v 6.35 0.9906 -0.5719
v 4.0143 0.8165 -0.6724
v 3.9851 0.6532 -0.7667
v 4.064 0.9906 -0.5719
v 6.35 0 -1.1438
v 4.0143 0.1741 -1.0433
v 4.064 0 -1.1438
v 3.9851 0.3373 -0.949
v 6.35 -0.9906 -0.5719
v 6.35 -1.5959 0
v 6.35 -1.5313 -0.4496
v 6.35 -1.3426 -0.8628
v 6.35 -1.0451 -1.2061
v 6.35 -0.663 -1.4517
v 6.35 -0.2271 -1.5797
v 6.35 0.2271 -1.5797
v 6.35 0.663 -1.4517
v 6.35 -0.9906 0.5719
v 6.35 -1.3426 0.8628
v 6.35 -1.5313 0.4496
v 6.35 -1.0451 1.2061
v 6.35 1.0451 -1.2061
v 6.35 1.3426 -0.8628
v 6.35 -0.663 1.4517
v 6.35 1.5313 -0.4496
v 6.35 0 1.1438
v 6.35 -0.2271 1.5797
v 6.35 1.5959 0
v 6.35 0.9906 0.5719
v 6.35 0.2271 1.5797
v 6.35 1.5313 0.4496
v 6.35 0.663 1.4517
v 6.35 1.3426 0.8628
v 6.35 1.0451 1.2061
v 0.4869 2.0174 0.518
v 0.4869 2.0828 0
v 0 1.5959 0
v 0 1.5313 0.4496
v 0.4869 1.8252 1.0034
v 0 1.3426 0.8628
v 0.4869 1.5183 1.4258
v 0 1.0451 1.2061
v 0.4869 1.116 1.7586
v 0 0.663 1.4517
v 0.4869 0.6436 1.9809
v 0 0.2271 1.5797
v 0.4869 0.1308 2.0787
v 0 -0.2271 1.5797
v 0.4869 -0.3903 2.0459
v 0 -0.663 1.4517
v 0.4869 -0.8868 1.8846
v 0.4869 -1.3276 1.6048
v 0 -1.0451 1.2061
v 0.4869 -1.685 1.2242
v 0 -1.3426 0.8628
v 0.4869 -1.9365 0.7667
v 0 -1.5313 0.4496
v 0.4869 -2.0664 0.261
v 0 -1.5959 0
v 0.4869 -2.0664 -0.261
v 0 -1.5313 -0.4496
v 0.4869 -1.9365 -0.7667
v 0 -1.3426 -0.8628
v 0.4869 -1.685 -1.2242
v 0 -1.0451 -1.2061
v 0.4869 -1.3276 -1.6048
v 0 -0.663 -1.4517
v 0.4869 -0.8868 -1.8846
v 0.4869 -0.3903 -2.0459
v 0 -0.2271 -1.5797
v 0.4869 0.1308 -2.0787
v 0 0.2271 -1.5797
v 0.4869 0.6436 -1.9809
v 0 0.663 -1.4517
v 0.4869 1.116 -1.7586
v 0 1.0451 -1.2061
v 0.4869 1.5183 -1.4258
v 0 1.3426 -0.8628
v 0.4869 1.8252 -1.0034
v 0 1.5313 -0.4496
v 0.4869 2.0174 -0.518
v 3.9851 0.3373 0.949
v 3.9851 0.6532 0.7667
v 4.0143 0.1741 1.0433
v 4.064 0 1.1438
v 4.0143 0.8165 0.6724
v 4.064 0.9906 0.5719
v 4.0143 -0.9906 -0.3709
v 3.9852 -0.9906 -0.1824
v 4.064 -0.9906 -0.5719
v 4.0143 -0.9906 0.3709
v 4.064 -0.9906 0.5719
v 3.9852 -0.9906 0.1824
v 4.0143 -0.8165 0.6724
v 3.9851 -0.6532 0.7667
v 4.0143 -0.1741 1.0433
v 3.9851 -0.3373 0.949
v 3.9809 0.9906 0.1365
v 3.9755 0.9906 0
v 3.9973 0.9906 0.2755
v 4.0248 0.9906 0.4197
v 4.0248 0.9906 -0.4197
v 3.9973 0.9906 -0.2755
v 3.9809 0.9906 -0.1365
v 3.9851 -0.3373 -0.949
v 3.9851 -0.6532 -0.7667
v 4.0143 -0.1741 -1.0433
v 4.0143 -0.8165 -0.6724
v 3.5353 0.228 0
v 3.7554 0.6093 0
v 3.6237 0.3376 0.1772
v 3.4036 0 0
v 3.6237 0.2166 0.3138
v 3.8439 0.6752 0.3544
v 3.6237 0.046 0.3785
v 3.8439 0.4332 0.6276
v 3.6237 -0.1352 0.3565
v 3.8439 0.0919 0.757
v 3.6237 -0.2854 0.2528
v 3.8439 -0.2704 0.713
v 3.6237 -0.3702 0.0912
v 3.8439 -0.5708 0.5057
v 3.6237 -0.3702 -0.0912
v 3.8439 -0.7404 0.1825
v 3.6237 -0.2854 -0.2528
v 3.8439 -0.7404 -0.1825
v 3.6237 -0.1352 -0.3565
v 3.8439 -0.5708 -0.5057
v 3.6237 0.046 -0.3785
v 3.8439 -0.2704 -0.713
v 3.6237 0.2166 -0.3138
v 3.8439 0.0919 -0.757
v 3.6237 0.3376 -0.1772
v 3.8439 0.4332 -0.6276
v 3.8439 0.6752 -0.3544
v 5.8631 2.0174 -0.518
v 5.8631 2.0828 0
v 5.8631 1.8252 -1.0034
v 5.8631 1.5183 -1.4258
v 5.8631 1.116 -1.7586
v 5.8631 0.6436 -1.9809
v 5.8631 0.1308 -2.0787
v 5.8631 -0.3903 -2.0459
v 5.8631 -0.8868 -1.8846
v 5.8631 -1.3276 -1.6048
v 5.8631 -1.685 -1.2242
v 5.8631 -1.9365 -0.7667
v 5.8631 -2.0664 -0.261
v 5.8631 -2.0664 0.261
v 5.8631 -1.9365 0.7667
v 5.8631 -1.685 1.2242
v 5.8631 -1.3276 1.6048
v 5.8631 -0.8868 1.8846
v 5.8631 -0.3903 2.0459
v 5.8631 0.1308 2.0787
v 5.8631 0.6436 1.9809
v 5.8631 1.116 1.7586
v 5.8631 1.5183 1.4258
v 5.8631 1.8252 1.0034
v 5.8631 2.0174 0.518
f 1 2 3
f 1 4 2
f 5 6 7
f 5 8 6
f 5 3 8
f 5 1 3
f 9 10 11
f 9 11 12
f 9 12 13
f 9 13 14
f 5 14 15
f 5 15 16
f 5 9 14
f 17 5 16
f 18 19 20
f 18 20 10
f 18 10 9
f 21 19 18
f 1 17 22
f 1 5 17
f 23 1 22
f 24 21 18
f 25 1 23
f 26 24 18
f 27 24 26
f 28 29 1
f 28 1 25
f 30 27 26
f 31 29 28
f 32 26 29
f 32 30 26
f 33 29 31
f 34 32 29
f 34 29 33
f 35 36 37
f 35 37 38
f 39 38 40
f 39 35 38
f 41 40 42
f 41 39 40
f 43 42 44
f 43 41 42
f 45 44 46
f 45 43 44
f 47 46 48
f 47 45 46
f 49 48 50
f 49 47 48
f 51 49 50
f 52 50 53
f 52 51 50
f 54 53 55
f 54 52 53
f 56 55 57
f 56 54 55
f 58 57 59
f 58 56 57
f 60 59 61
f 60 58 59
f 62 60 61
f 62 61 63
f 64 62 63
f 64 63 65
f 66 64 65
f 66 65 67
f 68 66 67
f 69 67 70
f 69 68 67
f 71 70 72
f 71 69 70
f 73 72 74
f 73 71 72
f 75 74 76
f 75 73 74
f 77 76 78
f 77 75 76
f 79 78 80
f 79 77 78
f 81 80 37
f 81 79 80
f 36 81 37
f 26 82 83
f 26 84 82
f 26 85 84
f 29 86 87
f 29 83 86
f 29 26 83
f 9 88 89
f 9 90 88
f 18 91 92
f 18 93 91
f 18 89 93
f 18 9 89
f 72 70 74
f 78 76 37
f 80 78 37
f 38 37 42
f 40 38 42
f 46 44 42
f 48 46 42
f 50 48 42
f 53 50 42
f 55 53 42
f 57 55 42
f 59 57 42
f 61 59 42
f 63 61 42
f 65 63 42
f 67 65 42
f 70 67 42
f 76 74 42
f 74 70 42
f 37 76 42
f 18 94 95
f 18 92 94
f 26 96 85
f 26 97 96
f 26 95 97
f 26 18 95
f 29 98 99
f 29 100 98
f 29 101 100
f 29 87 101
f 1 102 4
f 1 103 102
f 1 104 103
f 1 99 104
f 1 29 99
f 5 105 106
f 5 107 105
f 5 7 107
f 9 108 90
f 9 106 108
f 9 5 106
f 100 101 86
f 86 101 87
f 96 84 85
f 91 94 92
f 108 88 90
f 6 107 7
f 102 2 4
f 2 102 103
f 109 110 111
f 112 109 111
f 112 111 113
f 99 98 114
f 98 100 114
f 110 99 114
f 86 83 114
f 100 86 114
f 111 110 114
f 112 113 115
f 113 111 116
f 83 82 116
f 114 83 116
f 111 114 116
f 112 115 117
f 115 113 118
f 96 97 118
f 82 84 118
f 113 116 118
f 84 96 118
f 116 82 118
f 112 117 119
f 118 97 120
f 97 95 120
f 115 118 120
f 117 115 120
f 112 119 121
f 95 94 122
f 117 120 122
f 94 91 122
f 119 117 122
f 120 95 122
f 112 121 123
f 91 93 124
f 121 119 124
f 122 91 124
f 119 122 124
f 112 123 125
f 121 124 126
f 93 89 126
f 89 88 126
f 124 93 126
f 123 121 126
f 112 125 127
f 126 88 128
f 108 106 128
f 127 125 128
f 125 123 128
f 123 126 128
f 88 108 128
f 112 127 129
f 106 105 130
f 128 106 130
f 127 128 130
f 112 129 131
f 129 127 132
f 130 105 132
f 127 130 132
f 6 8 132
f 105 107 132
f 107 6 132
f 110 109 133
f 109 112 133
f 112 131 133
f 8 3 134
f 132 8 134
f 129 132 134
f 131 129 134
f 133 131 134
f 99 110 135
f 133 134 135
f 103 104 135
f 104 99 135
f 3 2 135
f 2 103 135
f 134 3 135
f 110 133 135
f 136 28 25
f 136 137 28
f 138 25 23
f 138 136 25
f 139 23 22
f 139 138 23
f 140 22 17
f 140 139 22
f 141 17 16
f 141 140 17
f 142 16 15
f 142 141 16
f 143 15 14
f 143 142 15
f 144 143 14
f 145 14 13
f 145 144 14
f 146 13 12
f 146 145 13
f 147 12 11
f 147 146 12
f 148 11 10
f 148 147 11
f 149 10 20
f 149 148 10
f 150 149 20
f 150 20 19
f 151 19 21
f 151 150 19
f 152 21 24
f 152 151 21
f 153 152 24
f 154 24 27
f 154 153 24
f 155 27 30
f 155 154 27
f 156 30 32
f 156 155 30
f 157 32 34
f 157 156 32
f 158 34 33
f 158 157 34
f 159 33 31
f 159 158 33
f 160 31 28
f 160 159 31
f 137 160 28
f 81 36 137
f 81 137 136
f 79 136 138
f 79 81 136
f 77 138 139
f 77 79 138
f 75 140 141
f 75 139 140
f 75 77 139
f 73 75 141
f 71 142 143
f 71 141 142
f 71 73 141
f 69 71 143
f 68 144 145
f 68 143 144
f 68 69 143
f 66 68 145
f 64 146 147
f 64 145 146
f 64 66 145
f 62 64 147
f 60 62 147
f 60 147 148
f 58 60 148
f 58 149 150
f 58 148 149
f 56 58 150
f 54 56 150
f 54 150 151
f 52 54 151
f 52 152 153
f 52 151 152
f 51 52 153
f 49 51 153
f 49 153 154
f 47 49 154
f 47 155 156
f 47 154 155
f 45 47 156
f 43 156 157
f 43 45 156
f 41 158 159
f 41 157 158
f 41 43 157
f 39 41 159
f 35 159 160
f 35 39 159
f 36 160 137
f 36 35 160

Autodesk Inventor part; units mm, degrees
ref_plane "YZ Plane" through (0, 0, 0) normal (1, 0, 0) x (0, 1, 0)
ref_plane "XZ Plane" through (0, 0, 0) normal (0, 1, 0) x (-1, 0, 0)
sketch "Sketch1" plane through (0, 0, 0) normal (0, 0, 1) x (1, 0, 0)
  line L0 (0, 0) -> (3.4036, 0)
  line L1 (6.35, 1.1438) -> (6.35, 2.0828)
  line L2 (6.35, 2.0828) -> (0, 2.0828)
  line L3 (6.35, 1.1438) -> (4.064, 1.1438)
  line L4 (4.064, 1.1438) -> (3.4036, 0)
  line L5 (0, -0.4166) -> (0, 2.4994) projected
  line L6 (0, 2.0828) -> (0, 0)
  dimension "d0" = 2.286
  dimension "d1" = 60
  dimension "d2" = 4.1656
  dimension "d3" = 2.2877
  dimension "d5" = 6.35
revolve "Body" add sketch "Sketch1" angle 360 about axis through (0, 0, 0) along (1, 0, 0)
chamfer "Chamfer1" distance 0.4869 angle 45 1 edges at (6.35, -2.0828, 0) measured on face at (6.35, 1.7386, -0.2574)
sketch "Sketch2" plane through (6.35, 0, 0) normal (1, 0, 0) x (0, 0, -1)
  circle A0 centre (0, 0) radius 1.1438 projected
  line L0 (-0.5719, 0.9906) -> (0.5719, 0.9906)
  line L1 (0.5719, 0.9906) -> (1.1438, 0)
  line L2 (1.1438, 0) -> (0.5719, -0.9906)
  line L3 (0.5719, -0.9906) -> (-0.5719, -0.9906)
  line L4 (-0.5719, -0.9906) -> (-1.1438, 0)
  line L5 (-1.1438, 0) -> (-0.5719, 0.9906)
  point P0 (0, 0)
  point P1 (0, 0)
extrude "Slot" add sketch "Sketch2" against normal up to next contours L1 A0 | A0 L2 | L0 A0 | A0 L3 | L5 A0 | A0 L4
thread "Thread" size "8-32 UNC" class "2A" standard "ANSI Unified Screw Threads" length 6.35
chamfer "Chamfer2" distance 0.4869 angle 45 1 edges at (0, -2.0828, 0) measured on face at (1.9544, 2.076, -0.1676)
ref_plane "Work Plane1" through (3.175, 0, 0) normal (0, 0.5, 0.866) x (1, 0, 0)
equation "\"d0\" = INTI"
equation "\"d2\" = NND"
equation "\"d3\" = 1.1547 * SW"
equation "\"d5\" = NLG"
equation "\"d7\" = -0.5 * GD1 + 0.5 * NND"
equation "\"d8\" = FAWI"
equation "\"d29\" = -0.5 * GD1 + 0.5 * NND"
equation "\"d11\" = NLG"
equation "\"d13\" = -0.5 * GD1 + 0.5 * NND"
equation "\"d14\" = FAWI"
equation "\"d30\" = -0.5 * GD1 + 0.5 * NND"
equation "\"NND\" = 4.1656"
equation "\"NLG\" = 6.35"
equation "\"INTI\" = 2.286"
equation "\"FAWI\" = 45deg"
equation "\"SW\" = 1.9812"
equation "\"GD1\" = 3.19177"
equation "\"FAWI1\" = 45deg"
equation "\"SPD\" = 2.2098"
equation "\"SEWI\" = 90deg"
equation "\"TOA\" = 30deg"
equation "\"ZLG\" = 1.0922"
equation "\"ZD\" = 2.7686"
equation "\"HHPTC\" = 0.79375"
equation "\"THREADDIA\" = 4.1656"
equation "\"OPR\" = 3.1242"
equation "\"E0\" = 1.155 * SW"
properties part number "ANSI B18.3 - 8-32 UNC x 0.25" material "Steel, Mild"
